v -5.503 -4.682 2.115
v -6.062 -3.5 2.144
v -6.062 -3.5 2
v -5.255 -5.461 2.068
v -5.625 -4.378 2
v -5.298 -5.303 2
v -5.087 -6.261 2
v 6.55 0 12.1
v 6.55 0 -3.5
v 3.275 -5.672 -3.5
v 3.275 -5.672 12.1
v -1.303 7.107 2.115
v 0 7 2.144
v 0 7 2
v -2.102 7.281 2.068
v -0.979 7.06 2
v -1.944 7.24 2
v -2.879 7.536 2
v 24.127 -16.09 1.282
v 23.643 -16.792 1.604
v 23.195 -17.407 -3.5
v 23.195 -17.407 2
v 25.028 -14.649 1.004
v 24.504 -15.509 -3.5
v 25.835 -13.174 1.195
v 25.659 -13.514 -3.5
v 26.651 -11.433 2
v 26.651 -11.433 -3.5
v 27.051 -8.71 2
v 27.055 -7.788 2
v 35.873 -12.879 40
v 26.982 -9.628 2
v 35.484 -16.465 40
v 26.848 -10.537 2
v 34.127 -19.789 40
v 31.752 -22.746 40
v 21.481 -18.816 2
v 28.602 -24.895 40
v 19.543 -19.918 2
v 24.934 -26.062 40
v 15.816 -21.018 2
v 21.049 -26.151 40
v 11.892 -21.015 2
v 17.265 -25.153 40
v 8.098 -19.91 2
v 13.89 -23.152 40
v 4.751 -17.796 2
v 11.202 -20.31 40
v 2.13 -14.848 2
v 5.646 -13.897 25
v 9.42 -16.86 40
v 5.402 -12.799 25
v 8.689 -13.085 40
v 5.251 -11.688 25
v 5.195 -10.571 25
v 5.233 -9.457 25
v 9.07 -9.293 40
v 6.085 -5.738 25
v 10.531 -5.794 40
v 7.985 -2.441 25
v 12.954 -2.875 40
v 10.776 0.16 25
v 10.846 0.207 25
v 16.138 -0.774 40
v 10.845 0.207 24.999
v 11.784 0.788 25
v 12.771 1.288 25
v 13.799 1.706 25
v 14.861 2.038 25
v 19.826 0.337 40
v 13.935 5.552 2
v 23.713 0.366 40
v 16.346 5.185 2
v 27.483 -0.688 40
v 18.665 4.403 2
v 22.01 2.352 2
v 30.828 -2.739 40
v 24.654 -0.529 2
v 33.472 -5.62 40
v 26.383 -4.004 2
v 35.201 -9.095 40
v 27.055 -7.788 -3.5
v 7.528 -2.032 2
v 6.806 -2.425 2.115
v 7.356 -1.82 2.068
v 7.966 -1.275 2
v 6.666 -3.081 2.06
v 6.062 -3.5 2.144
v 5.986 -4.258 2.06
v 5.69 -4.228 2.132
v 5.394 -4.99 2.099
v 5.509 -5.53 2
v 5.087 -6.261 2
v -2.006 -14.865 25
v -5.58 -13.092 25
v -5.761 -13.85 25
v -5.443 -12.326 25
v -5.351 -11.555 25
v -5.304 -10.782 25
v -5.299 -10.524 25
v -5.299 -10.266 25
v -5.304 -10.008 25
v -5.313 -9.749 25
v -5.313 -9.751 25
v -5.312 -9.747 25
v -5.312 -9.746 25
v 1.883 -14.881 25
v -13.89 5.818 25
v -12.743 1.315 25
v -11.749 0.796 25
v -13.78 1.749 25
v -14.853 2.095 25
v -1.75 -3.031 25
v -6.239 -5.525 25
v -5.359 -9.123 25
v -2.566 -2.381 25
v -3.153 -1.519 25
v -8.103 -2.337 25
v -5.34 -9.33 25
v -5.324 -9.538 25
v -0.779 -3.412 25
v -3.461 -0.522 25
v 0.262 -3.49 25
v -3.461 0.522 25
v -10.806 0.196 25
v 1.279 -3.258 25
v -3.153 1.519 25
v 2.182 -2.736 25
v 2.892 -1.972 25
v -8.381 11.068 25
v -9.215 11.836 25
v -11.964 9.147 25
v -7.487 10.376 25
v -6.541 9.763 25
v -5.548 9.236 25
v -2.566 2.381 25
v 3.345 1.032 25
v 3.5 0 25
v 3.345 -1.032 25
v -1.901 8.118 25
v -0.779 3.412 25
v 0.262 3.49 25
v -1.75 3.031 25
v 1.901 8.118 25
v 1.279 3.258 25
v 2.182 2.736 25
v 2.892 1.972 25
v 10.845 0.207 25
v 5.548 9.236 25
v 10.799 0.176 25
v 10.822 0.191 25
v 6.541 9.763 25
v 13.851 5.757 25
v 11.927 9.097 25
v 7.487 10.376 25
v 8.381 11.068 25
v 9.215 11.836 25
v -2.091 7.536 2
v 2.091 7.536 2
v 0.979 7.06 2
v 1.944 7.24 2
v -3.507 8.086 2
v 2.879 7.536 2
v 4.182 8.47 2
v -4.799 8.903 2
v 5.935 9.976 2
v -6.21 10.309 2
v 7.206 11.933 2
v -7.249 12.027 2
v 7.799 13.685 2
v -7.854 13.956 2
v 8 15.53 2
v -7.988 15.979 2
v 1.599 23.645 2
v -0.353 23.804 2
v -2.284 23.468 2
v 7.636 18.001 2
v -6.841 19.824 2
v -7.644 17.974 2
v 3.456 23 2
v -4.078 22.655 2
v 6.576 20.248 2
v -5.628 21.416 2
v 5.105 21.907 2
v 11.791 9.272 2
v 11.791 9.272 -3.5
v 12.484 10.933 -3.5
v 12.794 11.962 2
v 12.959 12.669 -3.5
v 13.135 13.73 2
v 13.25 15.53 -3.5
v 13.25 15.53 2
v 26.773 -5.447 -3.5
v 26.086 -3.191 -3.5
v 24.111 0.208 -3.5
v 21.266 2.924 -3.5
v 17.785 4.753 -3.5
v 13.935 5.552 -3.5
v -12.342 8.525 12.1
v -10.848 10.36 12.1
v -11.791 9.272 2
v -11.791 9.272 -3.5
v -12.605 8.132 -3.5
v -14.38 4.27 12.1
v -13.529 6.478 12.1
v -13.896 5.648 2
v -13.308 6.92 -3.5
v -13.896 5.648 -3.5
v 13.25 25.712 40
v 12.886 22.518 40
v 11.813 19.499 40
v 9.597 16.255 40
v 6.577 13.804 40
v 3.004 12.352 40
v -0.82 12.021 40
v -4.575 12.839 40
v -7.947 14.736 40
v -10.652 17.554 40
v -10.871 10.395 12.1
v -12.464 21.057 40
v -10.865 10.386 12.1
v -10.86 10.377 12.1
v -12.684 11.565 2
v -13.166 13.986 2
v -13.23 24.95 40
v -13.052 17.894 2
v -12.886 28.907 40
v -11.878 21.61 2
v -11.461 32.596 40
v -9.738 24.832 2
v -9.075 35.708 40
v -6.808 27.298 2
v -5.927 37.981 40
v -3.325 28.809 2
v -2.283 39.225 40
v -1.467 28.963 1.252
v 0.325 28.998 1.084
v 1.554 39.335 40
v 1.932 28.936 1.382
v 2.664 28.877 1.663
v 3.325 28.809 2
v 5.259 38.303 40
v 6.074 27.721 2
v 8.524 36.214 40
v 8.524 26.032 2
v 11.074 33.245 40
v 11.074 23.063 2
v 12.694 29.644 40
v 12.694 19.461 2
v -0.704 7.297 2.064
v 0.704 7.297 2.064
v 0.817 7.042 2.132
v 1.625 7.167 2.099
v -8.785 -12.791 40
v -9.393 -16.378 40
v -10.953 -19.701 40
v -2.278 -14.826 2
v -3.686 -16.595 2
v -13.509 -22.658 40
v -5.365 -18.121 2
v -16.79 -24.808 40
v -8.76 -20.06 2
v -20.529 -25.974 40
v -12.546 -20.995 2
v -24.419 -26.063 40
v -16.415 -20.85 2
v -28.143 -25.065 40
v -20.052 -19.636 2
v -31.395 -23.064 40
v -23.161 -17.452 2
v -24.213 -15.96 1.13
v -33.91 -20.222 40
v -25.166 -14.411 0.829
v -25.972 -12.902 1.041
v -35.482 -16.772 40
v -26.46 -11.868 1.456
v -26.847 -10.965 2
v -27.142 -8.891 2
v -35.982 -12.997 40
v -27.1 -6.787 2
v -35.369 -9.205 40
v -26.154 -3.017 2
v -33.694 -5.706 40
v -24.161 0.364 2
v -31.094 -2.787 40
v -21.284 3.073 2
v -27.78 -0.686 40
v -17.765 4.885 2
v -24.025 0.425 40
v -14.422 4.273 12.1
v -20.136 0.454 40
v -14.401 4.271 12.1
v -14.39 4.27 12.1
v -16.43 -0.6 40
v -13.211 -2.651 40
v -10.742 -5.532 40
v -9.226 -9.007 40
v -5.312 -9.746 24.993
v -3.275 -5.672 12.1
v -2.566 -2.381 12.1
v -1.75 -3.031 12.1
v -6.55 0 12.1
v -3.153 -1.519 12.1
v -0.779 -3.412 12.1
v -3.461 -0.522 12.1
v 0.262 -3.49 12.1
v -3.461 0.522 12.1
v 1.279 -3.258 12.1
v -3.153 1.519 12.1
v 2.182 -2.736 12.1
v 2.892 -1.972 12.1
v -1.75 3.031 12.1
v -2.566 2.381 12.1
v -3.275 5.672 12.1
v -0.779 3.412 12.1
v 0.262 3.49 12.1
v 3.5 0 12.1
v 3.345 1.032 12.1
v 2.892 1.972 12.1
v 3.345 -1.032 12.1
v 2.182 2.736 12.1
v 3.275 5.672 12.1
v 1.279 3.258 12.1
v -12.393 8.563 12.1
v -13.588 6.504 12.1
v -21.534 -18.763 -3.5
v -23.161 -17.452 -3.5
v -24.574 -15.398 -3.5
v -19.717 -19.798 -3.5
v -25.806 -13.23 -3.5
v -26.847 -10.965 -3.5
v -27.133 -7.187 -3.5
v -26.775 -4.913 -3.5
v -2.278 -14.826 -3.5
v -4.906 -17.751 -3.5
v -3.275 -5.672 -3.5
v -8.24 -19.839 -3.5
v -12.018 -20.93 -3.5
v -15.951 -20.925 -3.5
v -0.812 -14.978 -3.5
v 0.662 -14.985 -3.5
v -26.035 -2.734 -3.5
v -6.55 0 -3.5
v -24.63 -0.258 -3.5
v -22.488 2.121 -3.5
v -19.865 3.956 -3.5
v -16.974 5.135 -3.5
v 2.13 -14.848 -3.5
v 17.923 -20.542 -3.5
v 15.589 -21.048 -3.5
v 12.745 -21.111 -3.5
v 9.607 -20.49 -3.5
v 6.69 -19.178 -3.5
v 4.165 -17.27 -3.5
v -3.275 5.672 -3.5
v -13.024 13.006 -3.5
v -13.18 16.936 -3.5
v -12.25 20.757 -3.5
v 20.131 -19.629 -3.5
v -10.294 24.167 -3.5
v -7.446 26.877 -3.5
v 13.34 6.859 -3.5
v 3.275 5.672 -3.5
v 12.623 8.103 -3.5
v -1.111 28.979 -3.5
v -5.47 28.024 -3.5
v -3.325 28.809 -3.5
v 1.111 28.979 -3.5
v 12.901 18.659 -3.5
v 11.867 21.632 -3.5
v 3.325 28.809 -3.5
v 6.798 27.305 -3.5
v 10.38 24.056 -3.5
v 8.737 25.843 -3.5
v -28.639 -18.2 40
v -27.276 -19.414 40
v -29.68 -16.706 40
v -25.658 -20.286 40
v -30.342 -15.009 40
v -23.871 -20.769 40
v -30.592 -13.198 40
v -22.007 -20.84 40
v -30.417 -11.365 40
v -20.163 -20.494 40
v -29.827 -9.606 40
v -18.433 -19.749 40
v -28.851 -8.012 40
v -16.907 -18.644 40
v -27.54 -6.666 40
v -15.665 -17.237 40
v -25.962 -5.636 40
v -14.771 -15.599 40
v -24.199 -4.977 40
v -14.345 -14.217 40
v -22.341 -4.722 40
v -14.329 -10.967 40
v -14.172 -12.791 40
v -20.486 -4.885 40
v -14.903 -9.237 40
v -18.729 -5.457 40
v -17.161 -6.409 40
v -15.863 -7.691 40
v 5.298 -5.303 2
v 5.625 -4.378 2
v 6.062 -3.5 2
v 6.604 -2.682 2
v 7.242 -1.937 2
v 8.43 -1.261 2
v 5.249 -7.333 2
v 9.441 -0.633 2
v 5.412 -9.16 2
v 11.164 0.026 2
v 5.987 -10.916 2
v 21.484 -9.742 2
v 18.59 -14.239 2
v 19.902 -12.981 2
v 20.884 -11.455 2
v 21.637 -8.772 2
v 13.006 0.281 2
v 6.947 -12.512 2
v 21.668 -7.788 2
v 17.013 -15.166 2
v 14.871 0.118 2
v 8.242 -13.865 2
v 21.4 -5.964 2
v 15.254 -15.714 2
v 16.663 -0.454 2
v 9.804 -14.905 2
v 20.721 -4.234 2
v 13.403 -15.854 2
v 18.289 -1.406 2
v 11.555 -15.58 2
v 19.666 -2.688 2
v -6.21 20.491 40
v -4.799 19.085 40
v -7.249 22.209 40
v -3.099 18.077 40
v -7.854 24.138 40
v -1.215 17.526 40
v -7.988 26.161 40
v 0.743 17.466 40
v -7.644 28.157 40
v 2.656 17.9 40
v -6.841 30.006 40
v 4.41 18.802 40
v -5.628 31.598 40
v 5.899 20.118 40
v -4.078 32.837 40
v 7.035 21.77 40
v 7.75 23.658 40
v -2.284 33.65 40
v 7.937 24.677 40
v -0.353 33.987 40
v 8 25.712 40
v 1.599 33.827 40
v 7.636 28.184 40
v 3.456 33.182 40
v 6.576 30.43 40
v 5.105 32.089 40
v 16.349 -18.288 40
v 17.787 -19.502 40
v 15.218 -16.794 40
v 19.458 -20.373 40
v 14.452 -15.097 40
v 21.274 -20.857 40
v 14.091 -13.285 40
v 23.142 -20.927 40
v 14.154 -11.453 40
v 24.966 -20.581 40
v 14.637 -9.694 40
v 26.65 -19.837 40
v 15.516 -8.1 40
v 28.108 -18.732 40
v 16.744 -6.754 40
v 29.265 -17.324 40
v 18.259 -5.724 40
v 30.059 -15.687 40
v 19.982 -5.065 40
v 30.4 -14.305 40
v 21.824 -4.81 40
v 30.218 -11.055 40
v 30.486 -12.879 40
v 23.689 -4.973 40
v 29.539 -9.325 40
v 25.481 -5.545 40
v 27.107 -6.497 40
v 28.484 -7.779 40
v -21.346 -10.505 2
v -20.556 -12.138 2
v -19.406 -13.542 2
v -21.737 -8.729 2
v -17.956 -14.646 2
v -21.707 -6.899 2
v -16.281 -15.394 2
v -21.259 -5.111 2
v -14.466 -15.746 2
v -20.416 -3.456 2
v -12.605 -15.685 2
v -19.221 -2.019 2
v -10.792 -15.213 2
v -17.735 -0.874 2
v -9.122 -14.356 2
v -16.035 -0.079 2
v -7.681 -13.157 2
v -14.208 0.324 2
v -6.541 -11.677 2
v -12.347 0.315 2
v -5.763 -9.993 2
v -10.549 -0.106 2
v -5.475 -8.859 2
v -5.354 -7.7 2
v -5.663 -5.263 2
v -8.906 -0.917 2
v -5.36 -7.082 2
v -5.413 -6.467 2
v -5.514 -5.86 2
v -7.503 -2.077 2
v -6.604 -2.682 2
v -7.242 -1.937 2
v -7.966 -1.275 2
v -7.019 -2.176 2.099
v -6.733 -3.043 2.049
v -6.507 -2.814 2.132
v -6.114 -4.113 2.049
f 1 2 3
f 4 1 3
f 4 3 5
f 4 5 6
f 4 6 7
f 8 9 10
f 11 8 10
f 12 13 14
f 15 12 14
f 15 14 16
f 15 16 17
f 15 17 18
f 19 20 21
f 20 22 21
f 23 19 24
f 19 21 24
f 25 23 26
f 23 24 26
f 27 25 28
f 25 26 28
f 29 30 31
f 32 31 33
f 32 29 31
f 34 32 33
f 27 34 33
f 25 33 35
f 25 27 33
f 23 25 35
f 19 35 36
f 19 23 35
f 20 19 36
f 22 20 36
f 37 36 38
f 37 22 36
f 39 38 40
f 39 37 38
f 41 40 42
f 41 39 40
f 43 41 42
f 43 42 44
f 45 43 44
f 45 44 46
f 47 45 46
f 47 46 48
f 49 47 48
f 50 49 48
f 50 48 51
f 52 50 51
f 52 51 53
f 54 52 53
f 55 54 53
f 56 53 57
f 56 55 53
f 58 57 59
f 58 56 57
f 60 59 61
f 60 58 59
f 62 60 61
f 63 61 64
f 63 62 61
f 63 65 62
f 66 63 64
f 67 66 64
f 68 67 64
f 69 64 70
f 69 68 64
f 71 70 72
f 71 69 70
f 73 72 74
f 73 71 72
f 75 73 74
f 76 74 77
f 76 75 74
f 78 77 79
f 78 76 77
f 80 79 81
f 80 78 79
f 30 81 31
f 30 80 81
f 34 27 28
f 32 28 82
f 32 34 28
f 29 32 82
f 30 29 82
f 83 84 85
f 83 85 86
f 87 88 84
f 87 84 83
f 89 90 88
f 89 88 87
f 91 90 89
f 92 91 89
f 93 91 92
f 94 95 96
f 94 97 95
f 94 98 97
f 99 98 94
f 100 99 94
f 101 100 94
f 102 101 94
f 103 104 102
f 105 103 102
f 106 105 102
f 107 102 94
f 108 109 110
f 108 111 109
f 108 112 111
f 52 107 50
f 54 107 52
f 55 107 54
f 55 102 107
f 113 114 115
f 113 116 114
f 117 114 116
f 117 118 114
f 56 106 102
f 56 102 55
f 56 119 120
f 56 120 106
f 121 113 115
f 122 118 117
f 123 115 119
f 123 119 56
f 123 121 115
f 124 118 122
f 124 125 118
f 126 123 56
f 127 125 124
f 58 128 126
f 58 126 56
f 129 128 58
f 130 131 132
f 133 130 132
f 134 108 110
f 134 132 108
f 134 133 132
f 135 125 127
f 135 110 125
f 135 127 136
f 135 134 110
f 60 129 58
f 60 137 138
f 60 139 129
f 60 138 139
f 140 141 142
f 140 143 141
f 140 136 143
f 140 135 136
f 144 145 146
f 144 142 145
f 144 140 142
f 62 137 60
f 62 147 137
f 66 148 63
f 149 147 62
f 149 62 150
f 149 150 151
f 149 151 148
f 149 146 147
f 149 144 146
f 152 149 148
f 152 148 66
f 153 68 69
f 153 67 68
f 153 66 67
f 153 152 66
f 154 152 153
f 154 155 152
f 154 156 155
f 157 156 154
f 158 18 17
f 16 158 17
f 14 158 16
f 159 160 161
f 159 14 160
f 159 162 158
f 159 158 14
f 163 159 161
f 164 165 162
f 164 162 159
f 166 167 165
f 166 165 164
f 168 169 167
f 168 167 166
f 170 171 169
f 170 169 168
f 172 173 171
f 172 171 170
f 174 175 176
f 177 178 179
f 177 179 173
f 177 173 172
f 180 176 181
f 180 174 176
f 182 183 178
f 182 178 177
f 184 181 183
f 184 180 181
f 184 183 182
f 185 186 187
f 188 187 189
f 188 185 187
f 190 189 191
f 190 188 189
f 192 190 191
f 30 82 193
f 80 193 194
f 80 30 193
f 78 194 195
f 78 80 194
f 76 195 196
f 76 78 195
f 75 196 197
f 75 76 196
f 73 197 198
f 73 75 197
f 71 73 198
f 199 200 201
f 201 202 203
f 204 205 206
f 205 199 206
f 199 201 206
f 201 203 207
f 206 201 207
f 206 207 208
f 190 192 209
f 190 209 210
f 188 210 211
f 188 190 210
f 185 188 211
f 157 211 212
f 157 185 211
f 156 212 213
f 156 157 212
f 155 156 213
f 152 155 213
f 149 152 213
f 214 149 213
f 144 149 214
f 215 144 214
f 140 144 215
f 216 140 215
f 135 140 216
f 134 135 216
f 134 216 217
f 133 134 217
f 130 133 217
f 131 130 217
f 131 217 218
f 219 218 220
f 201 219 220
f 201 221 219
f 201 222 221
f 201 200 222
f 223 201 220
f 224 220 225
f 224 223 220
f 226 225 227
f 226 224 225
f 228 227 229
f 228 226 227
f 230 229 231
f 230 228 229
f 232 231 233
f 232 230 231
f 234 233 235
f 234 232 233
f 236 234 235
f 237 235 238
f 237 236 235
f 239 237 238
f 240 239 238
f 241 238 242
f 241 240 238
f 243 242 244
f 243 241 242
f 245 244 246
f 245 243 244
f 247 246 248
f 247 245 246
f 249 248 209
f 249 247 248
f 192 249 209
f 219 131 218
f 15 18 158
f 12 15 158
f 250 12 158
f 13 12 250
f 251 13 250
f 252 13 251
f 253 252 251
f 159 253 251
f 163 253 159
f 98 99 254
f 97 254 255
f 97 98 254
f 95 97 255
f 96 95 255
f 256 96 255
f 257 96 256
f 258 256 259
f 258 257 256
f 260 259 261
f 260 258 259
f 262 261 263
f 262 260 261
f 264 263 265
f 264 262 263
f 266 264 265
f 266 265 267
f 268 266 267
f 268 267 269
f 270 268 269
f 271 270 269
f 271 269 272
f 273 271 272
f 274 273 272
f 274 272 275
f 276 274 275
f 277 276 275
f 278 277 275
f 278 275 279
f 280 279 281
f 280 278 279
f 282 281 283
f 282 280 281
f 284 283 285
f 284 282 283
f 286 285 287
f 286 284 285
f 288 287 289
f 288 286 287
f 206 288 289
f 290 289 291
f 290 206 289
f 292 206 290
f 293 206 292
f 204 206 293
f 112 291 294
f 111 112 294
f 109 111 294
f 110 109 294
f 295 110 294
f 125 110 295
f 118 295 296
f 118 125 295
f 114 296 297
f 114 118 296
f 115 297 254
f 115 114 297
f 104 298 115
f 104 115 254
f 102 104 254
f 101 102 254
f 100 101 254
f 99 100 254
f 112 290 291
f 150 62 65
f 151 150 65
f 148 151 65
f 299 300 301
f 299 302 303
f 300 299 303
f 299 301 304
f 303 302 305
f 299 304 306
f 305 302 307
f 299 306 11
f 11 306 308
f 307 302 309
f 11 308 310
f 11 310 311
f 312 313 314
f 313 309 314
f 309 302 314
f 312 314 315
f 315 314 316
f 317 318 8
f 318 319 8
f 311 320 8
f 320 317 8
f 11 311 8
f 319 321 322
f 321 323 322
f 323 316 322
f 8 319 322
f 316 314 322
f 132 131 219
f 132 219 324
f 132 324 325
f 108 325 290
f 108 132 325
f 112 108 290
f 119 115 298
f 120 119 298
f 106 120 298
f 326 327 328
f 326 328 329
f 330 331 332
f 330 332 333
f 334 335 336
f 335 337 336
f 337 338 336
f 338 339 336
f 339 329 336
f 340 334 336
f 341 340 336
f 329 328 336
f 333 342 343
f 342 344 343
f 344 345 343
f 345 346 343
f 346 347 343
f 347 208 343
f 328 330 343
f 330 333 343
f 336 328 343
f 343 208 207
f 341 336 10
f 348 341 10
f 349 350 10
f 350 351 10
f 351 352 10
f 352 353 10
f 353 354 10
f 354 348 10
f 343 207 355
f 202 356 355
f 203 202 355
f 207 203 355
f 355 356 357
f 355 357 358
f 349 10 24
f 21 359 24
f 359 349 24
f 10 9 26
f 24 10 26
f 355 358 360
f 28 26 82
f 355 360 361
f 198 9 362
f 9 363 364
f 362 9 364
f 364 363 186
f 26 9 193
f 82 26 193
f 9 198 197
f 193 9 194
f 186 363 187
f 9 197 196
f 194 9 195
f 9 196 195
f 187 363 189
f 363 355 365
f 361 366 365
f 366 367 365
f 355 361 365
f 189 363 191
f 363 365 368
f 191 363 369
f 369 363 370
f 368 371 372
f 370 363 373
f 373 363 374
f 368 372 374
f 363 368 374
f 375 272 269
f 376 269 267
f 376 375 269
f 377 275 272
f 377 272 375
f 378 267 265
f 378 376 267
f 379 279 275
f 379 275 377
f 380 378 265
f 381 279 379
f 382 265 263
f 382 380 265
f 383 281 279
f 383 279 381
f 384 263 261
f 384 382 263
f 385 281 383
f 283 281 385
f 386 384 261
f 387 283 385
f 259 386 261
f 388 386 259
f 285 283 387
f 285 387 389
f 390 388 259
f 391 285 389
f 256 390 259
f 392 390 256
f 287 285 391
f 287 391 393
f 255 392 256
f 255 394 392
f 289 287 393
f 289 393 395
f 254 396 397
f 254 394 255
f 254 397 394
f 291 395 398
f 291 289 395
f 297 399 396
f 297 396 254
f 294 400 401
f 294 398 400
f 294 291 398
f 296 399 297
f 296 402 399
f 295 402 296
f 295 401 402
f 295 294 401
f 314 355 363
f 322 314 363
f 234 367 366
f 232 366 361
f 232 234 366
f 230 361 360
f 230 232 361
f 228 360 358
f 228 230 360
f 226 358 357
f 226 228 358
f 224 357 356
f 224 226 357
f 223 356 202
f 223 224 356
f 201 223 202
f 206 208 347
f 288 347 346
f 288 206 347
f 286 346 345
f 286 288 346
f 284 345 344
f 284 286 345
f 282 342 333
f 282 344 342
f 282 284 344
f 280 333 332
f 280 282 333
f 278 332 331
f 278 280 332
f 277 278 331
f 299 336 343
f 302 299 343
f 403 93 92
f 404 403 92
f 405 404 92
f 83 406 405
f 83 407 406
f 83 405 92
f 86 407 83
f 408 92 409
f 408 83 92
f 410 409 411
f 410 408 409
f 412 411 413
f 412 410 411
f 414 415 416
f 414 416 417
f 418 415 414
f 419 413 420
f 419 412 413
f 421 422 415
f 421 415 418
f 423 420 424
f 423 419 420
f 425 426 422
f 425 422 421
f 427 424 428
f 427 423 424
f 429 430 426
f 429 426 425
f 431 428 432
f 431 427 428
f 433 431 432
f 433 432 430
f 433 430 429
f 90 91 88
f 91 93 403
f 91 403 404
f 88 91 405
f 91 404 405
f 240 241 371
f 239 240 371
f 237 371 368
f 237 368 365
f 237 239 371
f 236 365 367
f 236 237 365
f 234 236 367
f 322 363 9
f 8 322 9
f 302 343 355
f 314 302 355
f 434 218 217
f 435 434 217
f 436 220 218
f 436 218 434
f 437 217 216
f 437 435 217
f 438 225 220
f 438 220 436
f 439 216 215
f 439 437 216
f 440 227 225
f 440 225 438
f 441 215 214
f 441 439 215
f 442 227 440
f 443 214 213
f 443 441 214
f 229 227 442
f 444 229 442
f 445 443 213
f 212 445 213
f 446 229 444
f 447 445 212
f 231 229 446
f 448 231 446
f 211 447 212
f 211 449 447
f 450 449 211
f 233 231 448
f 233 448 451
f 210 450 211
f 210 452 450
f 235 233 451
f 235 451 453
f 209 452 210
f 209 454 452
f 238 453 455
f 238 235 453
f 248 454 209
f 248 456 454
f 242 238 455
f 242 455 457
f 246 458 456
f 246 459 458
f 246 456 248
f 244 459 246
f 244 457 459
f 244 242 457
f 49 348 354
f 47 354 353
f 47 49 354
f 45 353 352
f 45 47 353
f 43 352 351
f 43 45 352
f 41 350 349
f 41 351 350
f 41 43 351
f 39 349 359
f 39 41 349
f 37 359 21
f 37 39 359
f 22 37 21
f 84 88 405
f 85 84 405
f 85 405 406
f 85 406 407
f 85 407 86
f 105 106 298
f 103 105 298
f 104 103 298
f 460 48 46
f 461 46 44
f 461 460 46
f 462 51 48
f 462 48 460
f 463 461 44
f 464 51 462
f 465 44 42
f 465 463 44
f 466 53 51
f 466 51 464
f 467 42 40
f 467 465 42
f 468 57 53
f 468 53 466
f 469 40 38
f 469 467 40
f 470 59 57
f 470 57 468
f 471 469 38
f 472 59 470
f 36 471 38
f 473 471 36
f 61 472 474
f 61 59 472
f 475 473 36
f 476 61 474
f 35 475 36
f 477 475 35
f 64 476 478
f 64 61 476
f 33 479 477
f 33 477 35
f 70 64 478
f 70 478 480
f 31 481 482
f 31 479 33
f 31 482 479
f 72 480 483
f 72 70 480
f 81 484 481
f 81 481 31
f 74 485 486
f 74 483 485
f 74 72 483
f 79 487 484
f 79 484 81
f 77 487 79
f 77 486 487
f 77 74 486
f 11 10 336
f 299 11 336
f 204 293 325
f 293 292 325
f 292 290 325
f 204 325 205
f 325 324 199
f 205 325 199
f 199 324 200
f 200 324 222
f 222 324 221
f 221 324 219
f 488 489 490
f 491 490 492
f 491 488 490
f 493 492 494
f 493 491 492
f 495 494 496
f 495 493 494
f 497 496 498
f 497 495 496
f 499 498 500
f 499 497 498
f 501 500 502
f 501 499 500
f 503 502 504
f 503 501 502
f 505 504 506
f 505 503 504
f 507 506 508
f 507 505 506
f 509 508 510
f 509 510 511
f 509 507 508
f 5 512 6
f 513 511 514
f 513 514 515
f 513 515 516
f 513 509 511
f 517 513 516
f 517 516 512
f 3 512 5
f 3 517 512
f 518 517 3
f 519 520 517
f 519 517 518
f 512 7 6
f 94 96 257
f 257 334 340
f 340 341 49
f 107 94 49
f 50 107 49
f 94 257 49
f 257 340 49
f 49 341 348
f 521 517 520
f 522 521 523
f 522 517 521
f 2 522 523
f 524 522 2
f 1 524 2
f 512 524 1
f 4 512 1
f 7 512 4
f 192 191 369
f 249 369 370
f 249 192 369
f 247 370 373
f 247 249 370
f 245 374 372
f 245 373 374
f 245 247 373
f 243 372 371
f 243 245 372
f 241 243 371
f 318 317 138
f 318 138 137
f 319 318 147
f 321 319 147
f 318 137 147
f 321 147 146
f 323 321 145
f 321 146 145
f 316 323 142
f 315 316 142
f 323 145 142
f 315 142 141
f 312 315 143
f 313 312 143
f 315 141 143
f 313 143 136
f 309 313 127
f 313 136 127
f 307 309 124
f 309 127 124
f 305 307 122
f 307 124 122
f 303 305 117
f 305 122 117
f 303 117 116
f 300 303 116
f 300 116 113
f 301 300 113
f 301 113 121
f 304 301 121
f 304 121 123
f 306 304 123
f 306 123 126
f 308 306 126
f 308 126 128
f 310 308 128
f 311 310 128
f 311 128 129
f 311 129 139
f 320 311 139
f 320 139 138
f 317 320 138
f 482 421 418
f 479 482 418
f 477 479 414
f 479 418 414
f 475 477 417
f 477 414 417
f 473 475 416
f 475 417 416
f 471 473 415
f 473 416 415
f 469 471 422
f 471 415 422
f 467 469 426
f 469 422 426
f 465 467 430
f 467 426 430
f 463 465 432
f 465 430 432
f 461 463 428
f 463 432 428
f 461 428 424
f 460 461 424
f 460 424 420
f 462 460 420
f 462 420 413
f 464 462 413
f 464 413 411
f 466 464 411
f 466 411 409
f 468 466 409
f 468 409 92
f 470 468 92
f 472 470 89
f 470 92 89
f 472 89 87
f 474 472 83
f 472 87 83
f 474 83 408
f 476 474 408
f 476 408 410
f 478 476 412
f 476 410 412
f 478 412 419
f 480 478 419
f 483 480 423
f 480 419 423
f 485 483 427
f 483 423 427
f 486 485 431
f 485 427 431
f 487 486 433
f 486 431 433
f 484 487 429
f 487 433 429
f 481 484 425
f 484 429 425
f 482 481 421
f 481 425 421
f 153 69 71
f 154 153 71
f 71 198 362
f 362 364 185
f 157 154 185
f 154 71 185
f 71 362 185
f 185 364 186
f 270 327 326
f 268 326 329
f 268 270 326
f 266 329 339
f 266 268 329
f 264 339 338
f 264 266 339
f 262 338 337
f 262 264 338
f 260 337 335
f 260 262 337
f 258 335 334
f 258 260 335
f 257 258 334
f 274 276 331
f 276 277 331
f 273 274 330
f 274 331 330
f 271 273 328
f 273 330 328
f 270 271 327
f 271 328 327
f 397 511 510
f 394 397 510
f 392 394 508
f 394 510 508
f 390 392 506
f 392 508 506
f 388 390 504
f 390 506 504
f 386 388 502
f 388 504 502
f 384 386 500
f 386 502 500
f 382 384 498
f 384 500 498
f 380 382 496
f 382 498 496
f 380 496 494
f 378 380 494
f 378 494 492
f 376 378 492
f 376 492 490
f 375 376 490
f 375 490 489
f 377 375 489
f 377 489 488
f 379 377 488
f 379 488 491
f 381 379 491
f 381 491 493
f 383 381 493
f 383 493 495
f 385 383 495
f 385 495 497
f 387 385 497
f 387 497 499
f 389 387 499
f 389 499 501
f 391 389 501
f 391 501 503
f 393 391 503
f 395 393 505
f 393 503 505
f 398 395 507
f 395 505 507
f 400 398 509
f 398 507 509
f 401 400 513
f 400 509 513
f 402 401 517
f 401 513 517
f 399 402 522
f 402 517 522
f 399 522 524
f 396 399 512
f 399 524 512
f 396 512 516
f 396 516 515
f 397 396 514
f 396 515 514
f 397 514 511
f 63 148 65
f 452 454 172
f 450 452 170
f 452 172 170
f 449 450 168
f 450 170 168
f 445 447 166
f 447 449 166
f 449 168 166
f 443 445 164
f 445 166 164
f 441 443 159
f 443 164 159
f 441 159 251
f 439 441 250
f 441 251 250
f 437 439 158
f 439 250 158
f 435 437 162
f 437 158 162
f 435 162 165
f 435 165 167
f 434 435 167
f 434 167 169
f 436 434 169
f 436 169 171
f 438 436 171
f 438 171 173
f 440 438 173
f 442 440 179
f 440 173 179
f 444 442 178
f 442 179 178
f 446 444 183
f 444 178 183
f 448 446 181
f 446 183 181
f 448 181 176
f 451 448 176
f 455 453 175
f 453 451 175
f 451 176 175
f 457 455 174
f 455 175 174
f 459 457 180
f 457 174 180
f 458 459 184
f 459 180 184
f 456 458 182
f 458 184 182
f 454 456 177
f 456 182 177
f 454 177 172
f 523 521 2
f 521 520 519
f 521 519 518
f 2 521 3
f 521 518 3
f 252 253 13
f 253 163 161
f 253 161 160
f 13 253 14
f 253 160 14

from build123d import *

# Parameters (mm, degrees)
F5_R           = 13.25
F5_R_2         = 8
F7_DEPTH       = 50
F4_R           = 13.25
F4_R_2         = 8
F8_DEPTH       = 50
F6_R           = 13.25
F6_R_2         = 8
F9_DEPTH       = 50
F10_DEPTH      = 25
F11_R          = 29
F12_DEPTH      = 3.5
F12_DEPTH_BACK = 2
F13_R          = 3.5
F14_DEPTH      = 51.7280401213
F14_DEPTH_BACK = 25
F17_DEPTH      = 20
F18_R          = 3.5
F19_DEPTH      = 12.9
F20_DEPTH      = 25
F22_W          = 110.3683225811
F22_H          = 78.3186629415
F23_DEPTH      = 25


with BuildPart() as f7:
    # F5 (on line) → F7 (new body)
    with BuildSketch(Plane(origin=(0.8701905284, -0.5024047358, 3.75), x_dir=(0.9745560663, 0.0297636554, -0.2221589485), z_dir=(-0.224143868, 0.1294095226, -0.9659258263))):
        with Locations((12.4405659735, 7.4533997104)):
            Circle(F5_R)
        with Locations((12.4405659735, 7.4533997104)):
            Circle(F5_R_2, mode=Mode.SUBTRACT)
    extrude(amount=-F7_DEPTH)


with BuildPart() as f8:
    # F4 (on line) → F8 (new body)
    with BuildSketch(Plane(origin=(-0.8701905284, -0.5024047358, 3.75), x_dir=(0.9745560663, -0.0297636554, 0.2221589485), z_dir=(0.224143868, 0.1294095226, -0.9659258263))):
        with Locations((-12.544631958, 7.3663704097)):
            Circle(F4_R)
        with Locations((-12.544631958, 7.3663704097)):
            Circle(F4_R_2, mode=Mode.SUBTRACT)
    extrude(amount=-F8_DEPTH)


with BuildPart() as f9:
    # F6 (on line) → F9 (new body)
    with BuildSketch(Plane(origin=(0, 1.0048094716, 3.75), x_dir=(1, 0, 0), z_dir=(0, -0.2588190451, -0.9659258263))):
        with Locations((0, -14.4834918901)):
            Circle(F6_R)
        with Locations((0, -14.4834918901)):
            Circle(F6_R_2, mode=Mode.SUBTRACT)
    extrude(amount=-F9_DEPTH)


with BuildPart() as f10:
    # F0 (on Top) → F10 (new body)
    with BuildSketch(Plane.XY):
        with BuildLine():
            Line((0, 0), (6.0621778265, -3.5))
            ThreePointArc((6.0621778265, -3.5), (9.8988818392, -0.1214749043), (14.998015474, 0.2439914803))
            ThreePointArc((14.998015474, 0.2439914803), (12.9903810568, 7.5), (7.7103105572, 12.8666666667))
            ThreePointArc((7.7103105572, 12.8666666667), (4.8442405666, 8.633420594), (0, 7))
            Line((0, 7), (0, 0))
        make_face()
        with BuildLine():
            Line((-6.0621778265, -3.5), (0, 0))
            Line((0, 0), (0, 7))
            ThreePointArc((0, 7), (-4.8442405666, 8.633420594), (-7.7103105572, 12.8666666667))
            ThreePointArc((-7.7103105572, 12.8666666667), (-12.9903810568, 7.5), (-14.998015474, 0.2439914803))
            ThreePointArc((-14.998015474, 0.2439914803), (-9.8988818392, -0.1214749043), (-6.0621778265, -3.5))
        make_face()
        with BuildLine():
            ThreePointArc((-7.2877049167, -13.110658147), (0, -15), (7.2877049167, -13.110658147))
            ThreePointArc((7.2877049167, -13.110658147), (5.0546412727, -8.5119456897), (6.0621778265, -3.5))
            Line((6.0621778265, -3.5), (0, 0))
            Line((0, 0), (-6.0621778265, -3.5))
            ThreePointArc((-6.0621778265, -3.5), (-5.2629744465, -5.4294476392), (-4.9903810568, -7.5))
            ThreePointArc((-4.9903810568, -7.5), (-5.5869558657, -10.5313850696), (-7.2877049167, -13.110658147))
        make_face()
    extrude(amount=F10_DEPTH)


with BuildPart() as f12:
    # F11 (on Top) → F12 (new body, two sides)
    with BuildSketch(Plane.XY) as f12_sk:
        Circle(F11_R)
    extrude(amount=-F12_DEPTH)
    extrude(f12_sk.sketch, amount=F12_DEPTH_BACK)


with BuildPart() as f14_tool:
    # F13 (on Top) → F14 (new body, two sides)
    with BuildSketch(Plane.XY) as f14_sk:
        Circle(F13_R)
    extrude(amount=F14_DEPTH)
    extrude(f14_sk.sketch, amount=-F14_DEPTH_BACK)


with BuildPart() as f7_1:
    add(f7.part)

    # F14: cut by f14_tool
    add(f14_tool.part, mode=Mode.SUBTRACT)


with BuildPart() as f8_1:
    add(f8.part)

    # F14: cut by f14_tool
    add(f14_tool.part, mode=Mode.SUBTRACT)


with BuildPart() as f9_1:
    add(f9.part)

    # F14: cut by f14_tool
    add(f14_tool.part, mode=Mode.SUBTRACT)


with BuildPart() as f10_1:
    add(f10.part)

    # F14: cut by f14_tool
    add(f14_tool.part, mode=Mode.SUBTRACT)


with BuildPart() as f12_1:
    add(f12.part)

    # F14: cut by f14_tool
    add(f14_tool.part, mode=Mode.SUBTRACT)


with BuildPart() as f7_2:
    add(f7_1.part)

    # F15: union F8, F9, F10, F12
    add(f8_1.part)
    add(f9_1.part)
    add(f10_1.part)
    add(f12_1.part)

    # F16 (on face) → F17 (cut)
    with BuildSketch(Plane(origin=(0, 0, -3.5), x_dir=(1, 0, 0), z_dir=(0, 0, -1))):
        Polygon((-3.275, -5.6724663948), (3.275, -5.6724663948), (6.55, 0), (3.275, 5.6724663948), (-3.275, 5.6724663948), (-6.55, 0), align=None)
    extrude(amount=-F17_DEPTH, mode=Mode.SUBTRACT)

    # F18 (on face) → F19 (join)
    with BuildSketch(Plane.XY.offset(25)):
        with BuildLine():
            ThreePointArc((9.2145774198, 11.8360281756), (0, 7.9883032381), (-9.2145774198, 11.8360281756))
            ThreePointArc((-9.2145774198, 11.8360281756), (-13.0401831697, 7.5480168017), (-14.8529870725, 2.0949403392))
            ThreePointArc((-14.8529870725, 2.0949403392), (-6.9961529284, -3.9893730543), (-5.7610544028, -13.849557833))
            ThreePointArc((-5.7610544028, -13.849557833), (-0.06216489, -14.9998711837), (5.646063326, -13.8968330536))
            ThreePointArc((5.646063326, -13.8968330536), (6.9321877833, -4.0088841204), (14.8609587483, 2.0376224091))
            ThreePointArc((14.8609587483, 2.0376224091), (12.9965398986, 7.4893224435), (9.2145774198, 11.8360281756))
        make_face()
        Circle(F18_R, mode=Mode.SUBTRACT)
    extrude(amount=-F19_DEPTH)

    # F20 (cut): faces of the model
    f20_faces = [f7_2.faces().sort_by_distance(p)[0] for p in [
        (-0.065182715, -22.8612906219, 2),
        (19.8111281547, 11.4386598585, 2),
        (-19.780330483, 11.5571321241, 2),
    ]]
    extrude(f20_faces, amount=-F20_DEPTH, mode=Mode.SUBTRACT)

    # F22 (on offset) → F23 (cut)
    with BuildSketch(Plane.XY.offset(40)):
        with Locations((0.9703096002, 2.6732347906)):
            Rectangle(F22_W, F22_H)
    extrude(amount=F23_DEPTH, mode=Mode.SUBTRACT)


solid = f7_2.part
